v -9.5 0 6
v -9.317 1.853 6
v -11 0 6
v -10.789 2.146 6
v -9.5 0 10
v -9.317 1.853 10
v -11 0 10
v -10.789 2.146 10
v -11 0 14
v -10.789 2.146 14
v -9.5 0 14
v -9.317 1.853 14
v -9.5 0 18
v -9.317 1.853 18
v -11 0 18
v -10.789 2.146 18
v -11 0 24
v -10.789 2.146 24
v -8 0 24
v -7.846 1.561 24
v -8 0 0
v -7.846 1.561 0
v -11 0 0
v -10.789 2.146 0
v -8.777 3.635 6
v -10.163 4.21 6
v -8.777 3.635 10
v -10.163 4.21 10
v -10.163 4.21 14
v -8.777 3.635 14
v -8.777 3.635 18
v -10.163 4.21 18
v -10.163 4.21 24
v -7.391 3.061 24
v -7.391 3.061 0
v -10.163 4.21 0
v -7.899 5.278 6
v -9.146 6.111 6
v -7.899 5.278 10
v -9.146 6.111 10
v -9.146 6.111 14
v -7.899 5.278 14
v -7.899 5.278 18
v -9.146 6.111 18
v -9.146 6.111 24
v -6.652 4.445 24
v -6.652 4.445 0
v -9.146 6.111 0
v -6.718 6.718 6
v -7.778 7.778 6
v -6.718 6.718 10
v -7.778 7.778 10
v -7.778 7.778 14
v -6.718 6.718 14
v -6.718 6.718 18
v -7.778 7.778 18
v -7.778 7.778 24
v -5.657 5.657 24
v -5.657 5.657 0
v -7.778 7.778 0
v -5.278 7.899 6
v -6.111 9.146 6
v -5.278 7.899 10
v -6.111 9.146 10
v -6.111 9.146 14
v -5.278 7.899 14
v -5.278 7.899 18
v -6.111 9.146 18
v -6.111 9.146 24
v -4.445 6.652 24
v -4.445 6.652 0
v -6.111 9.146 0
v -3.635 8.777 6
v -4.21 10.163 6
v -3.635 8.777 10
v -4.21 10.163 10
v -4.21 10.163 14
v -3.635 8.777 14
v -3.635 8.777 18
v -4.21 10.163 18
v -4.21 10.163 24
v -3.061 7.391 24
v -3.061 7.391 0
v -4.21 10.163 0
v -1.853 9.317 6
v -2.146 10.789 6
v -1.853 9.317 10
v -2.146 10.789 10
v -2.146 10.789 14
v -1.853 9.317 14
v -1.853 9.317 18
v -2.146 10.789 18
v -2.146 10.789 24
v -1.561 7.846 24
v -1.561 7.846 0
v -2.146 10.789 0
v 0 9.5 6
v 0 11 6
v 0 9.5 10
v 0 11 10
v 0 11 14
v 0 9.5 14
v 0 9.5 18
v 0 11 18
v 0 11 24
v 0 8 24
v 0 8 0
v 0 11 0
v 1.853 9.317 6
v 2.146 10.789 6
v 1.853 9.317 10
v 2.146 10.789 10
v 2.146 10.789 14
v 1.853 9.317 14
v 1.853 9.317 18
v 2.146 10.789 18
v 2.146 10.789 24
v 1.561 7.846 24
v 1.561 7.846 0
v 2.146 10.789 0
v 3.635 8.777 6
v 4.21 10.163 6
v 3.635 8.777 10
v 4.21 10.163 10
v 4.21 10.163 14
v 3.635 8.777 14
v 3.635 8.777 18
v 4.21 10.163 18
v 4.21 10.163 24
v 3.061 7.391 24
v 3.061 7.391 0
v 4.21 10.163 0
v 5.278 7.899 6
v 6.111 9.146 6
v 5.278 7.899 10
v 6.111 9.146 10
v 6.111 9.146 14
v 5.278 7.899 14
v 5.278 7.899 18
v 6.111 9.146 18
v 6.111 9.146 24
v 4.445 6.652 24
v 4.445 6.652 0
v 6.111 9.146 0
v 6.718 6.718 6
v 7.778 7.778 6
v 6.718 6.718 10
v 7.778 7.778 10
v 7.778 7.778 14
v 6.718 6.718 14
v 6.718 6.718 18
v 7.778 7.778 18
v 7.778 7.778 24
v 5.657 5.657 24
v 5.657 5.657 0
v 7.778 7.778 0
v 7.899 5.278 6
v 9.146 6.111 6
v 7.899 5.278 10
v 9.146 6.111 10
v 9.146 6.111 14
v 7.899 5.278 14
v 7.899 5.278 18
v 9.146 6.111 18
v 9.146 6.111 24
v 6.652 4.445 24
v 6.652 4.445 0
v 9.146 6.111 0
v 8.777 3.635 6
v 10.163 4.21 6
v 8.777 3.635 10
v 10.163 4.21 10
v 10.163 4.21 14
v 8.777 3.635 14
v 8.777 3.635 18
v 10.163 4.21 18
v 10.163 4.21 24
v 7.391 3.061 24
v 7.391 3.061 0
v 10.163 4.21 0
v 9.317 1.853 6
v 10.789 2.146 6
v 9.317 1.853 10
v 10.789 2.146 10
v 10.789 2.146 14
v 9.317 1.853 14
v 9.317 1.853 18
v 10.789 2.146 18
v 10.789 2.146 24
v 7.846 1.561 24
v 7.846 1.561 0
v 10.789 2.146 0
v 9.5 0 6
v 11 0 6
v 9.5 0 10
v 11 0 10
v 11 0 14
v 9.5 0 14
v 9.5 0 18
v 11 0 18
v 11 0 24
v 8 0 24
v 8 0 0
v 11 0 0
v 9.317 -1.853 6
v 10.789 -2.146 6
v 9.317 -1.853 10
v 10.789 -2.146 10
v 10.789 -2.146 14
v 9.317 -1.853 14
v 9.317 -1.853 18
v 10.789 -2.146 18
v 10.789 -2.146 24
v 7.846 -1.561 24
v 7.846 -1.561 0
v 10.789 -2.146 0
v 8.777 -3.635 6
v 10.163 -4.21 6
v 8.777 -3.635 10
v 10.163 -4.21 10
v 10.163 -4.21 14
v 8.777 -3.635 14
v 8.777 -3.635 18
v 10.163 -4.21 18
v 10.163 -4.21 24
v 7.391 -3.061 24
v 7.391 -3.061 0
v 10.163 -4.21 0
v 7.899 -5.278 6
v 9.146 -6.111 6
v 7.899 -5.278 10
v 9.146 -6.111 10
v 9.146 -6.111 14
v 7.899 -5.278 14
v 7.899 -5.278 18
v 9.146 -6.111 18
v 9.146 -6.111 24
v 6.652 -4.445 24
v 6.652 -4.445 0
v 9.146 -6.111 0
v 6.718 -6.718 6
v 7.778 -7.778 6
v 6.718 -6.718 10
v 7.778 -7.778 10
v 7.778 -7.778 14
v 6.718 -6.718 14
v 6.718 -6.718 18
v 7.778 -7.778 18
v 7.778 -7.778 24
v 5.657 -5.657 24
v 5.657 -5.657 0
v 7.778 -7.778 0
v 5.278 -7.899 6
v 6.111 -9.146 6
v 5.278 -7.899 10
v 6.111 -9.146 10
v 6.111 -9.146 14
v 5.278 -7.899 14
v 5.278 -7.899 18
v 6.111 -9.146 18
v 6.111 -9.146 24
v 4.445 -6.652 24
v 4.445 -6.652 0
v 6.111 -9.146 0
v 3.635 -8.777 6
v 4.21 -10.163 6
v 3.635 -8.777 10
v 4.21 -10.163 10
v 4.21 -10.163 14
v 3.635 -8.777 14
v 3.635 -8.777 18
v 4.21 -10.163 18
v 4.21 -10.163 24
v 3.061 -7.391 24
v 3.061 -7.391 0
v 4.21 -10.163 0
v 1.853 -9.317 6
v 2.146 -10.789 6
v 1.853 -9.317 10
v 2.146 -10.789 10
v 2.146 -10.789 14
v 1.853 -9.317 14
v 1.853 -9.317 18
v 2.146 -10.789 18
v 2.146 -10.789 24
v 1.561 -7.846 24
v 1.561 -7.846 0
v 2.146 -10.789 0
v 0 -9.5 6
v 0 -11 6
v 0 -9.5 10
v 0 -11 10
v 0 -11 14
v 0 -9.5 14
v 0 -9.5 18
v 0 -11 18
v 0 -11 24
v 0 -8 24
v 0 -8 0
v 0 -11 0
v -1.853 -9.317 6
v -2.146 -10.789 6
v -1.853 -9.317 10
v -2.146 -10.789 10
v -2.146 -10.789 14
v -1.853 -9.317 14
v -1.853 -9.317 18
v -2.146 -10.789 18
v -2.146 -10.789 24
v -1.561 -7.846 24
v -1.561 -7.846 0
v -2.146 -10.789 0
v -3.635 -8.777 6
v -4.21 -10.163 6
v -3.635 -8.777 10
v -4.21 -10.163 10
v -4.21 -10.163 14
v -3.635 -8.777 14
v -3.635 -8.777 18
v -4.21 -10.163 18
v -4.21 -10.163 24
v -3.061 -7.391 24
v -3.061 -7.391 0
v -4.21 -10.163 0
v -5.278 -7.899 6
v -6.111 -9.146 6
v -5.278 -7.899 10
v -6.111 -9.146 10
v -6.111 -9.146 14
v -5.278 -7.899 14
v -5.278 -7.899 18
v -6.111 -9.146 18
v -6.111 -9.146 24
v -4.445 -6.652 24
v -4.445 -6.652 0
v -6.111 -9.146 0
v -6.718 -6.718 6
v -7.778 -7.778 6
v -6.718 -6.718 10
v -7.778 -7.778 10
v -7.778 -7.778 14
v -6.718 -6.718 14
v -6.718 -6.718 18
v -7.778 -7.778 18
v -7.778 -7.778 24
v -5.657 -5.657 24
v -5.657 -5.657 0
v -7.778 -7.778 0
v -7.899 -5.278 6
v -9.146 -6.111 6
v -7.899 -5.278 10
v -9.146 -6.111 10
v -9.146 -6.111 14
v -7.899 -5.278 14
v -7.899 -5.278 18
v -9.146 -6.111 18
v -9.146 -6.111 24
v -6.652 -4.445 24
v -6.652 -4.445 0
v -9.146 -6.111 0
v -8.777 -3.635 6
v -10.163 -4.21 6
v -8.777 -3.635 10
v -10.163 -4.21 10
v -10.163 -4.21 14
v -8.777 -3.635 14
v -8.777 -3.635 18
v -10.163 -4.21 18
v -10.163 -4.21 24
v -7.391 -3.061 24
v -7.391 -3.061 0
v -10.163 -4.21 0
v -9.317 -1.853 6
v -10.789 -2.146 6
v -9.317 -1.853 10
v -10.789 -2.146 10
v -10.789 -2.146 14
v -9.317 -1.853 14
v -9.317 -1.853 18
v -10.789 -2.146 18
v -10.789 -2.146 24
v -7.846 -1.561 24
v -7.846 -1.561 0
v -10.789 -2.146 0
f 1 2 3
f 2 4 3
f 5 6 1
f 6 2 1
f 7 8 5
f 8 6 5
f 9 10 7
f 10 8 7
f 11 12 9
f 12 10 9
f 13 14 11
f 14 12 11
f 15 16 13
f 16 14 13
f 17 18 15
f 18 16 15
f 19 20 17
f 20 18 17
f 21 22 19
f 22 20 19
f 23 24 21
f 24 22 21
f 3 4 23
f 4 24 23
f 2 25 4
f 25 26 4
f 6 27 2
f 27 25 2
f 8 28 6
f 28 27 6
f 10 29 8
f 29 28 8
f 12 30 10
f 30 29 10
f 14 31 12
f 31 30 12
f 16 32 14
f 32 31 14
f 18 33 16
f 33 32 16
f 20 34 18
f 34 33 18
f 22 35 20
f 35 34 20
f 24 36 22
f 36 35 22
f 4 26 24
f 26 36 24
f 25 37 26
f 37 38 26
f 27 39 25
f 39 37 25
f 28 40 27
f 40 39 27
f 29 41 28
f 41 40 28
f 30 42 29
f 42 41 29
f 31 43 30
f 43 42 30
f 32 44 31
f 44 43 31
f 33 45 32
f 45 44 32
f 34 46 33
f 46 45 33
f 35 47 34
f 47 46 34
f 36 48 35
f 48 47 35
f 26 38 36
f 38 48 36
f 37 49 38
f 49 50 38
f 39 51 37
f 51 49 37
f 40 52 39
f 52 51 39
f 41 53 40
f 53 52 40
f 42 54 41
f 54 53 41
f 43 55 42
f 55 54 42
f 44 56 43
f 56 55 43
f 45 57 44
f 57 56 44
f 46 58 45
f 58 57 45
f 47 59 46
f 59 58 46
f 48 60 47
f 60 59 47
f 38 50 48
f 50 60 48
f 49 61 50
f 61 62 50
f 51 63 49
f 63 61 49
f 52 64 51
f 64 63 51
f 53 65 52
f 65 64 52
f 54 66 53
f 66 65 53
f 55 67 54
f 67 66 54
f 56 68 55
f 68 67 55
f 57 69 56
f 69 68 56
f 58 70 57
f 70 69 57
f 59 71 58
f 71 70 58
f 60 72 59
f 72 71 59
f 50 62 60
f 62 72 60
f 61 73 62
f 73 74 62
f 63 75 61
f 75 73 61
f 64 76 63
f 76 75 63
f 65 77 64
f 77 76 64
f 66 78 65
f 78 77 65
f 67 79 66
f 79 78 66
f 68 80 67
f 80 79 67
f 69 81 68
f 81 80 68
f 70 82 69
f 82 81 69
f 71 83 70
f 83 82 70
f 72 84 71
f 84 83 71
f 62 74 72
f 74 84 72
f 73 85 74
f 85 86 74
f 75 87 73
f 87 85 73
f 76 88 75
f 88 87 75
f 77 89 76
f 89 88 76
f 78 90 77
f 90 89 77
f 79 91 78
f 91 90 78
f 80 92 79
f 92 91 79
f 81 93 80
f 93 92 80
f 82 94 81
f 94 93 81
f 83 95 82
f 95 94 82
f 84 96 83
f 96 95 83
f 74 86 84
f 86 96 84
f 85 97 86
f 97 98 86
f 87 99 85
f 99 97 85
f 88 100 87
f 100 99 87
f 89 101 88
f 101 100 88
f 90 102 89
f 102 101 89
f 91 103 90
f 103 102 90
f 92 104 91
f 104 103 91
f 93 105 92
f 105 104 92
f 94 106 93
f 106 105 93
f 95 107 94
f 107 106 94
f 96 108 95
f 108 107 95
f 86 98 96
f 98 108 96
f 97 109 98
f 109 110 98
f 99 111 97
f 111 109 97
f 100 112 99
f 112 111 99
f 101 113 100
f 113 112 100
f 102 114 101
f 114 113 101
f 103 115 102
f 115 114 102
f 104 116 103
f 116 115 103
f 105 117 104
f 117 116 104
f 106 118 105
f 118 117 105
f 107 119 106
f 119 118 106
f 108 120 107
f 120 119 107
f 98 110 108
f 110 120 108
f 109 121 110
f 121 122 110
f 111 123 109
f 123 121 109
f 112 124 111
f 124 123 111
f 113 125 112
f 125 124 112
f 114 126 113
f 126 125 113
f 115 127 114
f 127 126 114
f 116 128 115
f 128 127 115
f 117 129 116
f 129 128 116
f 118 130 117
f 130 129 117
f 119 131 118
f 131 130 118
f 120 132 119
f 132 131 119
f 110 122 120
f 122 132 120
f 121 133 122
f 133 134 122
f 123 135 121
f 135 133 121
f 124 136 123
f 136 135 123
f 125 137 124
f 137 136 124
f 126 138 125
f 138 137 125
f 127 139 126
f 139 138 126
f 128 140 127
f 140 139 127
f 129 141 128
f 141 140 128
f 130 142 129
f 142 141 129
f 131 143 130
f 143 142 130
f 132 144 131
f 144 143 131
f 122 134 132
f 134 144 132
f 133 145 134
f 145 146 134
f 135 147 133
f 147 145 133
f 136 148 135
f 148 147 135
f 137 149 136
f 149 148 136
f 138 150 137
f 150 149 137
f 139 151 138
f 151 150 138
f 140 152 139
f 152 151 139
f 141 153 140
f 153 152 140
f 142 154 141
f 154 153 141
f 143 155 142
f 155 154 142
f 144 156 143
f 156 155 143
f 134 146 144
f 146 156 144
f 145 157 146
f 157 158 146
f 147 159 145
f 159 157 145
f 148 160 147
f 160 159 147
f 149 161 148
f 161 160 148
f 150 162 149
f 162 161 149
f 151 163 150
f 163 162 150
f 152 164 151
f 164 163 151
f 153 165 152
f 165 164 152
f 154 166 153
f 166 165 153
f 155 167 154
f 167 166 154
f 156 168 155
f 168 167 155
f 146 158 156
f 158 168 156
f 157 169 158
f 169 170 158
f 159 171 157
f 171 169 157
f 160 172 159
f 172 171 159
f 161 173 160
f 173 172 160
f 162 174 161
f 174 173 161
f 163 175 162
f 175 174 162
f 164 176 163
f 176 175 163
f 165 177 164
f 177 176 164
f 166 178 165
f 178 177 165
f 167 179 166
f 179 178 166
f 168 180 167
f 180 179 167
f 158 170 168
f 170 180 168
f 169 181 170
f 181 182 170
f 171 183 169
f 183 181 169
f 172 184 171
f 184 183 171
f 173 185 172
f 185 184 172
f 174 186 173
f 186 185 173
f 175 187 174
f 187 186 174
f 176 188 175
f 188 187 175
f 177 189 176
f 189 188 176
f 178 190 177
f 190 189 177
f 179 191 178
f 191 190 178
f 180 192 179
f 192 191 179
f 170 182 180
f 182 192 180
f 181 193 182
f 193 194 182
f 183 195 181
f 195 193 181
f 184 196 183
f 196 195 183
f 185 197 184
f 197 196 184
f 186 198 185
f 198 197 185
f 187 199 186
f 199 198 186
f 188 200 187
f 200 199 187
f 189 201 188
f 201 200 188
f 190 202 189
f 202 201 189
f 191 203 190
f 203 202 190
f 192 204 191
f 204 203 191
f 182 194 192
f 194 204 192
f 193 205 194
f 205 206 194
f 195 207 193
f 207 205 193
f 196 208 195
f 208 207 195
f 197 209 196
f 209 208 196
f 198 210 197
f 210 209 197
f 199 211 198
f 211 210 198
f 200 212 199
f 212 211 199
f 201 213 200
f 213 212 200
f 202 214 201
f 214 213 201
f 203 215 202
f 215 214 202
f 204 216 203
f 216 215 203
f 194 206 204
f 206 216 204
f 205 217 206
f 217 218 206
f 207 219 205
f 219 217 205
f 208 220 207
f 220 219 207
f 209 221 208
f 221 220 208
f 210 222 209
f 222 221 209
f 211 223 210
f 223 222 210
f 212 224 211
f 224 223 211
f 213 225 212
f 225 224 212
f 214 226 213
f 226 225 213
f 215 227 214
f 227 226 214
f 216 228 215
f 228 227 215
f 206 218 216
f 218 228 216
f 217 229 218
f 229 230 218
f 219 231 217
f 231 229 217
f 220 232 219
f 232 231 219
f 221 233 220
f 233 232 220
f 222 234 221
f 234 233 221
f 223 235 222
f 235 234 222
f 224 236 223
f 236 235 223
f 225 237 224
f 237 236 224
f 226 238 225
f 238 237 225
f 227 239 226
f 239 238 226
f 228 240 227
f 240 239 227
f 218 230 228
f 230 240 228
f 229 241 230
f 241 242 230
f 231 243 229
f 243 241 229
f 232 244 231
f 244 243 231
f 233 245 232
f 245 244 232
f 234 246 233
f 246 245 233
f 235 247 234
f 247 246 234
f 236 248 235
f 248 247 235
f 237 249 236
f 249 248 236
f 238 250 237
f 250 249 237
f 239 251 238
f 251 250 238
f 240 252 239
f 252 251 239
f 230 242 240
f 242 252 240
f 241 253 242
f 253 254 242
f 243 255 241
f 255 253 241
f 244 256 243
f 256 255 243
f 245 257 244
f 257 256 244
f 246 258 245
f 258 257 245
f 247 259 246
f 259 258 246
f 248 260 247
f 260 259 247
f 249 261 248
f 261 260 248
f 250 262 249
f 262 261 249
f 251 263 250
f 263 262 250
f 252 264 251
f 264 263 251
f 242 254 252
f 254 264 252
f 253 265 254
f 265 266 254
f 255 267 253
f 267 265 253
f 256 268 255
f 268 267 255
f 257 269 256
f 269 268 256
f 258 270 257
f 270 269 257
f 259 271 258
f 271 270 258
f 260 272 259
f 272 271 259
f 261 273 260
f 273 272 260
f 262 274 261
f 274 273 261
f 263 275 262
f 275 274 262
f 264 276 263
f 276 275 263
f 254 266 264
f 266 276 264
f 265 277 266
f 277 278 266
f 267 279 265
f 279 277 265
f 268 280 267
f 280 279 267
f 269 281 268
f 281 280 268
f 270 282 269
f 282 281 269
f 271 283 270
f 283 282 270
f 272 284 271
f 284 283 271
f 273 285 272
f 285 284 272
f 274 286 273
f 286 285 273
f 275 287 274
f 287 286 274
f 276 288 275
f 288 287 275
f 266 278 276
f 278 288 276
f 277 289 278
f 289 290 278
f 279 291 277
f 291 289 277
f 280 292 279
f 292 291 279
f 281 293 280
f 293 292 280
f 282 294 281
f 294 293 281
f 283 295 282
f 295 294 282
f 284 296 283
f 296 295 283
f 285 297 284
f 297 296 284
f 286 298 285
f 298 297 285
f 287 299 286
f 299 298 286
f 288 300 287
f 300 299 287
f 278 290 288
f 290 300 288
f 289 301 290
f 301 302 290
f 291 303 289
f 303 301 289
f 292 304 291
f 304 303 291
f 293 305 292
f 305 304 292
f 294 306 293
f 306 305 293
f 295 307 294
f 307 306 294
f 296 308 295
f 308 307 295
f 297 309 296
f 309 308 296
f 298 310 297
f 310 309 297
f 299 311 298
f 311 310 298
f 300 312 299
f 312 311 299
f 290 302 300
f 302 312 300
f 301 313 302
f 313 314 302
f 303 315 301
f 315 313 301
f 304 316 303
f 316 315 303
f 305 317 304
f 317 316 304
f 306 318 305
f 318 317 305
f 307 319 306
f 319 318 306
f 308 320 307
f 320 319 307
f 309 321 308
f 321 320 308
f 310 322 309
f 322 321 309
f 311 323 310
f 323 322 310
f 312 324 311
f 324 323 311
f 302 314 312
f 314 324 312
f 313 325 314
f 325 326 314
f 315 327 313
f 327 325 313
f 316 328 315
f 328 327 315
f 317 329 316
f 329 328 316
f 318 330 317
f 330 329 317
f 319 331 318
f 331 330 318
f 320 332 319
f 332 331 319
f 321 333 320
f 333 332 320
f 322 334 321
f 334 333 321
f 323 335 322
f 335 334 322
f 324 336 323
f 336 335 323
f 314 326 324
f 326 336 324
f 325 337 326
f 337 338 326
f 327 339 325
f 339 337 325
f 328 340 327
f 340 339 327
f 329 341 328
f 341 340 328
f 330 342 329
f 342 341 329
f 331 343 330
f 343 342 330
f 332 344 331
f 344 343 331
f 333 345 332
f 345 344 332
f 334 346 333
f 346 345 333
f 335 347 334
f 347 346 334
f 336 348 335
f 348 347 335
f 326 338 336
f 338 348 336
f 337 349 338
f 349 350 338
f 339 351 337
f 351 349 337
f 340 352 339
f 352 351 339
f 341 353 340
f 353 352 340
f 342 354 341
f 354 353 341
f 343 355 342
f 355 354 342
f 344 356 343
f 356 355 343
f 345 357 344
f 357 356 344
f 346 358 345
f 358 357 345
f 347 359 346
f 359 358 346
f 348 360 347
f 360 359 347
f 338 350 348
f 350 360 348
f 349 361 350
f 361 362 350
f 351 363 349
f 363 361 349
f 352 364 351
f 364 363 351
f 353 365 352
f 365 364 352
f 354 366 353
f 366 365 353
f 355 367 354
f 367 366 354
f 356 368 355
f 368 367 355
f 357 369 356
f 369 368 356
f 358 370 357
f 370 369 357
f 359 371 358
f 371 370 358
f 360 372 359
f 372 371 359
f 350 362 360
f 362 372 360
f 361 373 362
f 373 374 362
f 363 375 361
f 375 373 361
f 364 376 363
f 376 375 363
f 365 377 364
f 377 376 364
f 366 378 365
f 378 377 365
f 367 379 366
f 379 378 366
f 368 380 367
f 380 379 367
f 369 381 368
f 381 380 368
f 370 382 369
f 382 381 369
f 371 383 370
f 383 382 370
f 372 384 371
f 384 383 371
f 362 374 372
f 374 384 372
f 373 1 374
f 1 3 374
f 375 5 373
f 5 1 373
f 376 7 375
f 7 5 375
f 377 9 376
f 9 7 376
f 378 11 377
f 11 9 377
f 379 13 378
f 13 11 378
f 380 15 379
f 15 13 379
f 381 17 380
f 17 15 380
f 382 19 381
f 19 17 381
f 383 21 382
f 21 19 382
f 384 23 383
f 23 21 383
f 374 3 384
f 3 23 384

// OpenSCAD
$fn = 32;

// ----------------------------------------------------------------------
// Grooved revolve: plain_grooves, bore R8
// ----------------------------------------------------------------------

// --- parameters (mm) ---
bore_r = 8;               // bore radius
outer_r = 11;             // outer radius of the body
total_h = 24;             // overall height, Z
wall = 3;                 // radial wall thickness
groove_w = 4;             // groove width
groove_d = 1.5;           // groove depth
grooves = 2;              // number of outer grooves

bbox_x = 2 * outer_r;  // full diameter
bore_d = 2 * bore_r;  // bore diameter
body_d = 2 * outer_r;  // body diameter
revolve_angle = 360;  // full turn around the Z axis

profile = [[8, 0], [11, 0], [11, 6], [9.5, 6], [9.5, 10], [11, 10], [11, 14], [9.5, 14], [9.5, 18], [11, 18], [11, 24], [8, 24]];  // primary outline, 12 points, counter clockwise

// --- the one profile operation ---
rotate_extrude(angle = revolve_angle) polygon(points = profile);
